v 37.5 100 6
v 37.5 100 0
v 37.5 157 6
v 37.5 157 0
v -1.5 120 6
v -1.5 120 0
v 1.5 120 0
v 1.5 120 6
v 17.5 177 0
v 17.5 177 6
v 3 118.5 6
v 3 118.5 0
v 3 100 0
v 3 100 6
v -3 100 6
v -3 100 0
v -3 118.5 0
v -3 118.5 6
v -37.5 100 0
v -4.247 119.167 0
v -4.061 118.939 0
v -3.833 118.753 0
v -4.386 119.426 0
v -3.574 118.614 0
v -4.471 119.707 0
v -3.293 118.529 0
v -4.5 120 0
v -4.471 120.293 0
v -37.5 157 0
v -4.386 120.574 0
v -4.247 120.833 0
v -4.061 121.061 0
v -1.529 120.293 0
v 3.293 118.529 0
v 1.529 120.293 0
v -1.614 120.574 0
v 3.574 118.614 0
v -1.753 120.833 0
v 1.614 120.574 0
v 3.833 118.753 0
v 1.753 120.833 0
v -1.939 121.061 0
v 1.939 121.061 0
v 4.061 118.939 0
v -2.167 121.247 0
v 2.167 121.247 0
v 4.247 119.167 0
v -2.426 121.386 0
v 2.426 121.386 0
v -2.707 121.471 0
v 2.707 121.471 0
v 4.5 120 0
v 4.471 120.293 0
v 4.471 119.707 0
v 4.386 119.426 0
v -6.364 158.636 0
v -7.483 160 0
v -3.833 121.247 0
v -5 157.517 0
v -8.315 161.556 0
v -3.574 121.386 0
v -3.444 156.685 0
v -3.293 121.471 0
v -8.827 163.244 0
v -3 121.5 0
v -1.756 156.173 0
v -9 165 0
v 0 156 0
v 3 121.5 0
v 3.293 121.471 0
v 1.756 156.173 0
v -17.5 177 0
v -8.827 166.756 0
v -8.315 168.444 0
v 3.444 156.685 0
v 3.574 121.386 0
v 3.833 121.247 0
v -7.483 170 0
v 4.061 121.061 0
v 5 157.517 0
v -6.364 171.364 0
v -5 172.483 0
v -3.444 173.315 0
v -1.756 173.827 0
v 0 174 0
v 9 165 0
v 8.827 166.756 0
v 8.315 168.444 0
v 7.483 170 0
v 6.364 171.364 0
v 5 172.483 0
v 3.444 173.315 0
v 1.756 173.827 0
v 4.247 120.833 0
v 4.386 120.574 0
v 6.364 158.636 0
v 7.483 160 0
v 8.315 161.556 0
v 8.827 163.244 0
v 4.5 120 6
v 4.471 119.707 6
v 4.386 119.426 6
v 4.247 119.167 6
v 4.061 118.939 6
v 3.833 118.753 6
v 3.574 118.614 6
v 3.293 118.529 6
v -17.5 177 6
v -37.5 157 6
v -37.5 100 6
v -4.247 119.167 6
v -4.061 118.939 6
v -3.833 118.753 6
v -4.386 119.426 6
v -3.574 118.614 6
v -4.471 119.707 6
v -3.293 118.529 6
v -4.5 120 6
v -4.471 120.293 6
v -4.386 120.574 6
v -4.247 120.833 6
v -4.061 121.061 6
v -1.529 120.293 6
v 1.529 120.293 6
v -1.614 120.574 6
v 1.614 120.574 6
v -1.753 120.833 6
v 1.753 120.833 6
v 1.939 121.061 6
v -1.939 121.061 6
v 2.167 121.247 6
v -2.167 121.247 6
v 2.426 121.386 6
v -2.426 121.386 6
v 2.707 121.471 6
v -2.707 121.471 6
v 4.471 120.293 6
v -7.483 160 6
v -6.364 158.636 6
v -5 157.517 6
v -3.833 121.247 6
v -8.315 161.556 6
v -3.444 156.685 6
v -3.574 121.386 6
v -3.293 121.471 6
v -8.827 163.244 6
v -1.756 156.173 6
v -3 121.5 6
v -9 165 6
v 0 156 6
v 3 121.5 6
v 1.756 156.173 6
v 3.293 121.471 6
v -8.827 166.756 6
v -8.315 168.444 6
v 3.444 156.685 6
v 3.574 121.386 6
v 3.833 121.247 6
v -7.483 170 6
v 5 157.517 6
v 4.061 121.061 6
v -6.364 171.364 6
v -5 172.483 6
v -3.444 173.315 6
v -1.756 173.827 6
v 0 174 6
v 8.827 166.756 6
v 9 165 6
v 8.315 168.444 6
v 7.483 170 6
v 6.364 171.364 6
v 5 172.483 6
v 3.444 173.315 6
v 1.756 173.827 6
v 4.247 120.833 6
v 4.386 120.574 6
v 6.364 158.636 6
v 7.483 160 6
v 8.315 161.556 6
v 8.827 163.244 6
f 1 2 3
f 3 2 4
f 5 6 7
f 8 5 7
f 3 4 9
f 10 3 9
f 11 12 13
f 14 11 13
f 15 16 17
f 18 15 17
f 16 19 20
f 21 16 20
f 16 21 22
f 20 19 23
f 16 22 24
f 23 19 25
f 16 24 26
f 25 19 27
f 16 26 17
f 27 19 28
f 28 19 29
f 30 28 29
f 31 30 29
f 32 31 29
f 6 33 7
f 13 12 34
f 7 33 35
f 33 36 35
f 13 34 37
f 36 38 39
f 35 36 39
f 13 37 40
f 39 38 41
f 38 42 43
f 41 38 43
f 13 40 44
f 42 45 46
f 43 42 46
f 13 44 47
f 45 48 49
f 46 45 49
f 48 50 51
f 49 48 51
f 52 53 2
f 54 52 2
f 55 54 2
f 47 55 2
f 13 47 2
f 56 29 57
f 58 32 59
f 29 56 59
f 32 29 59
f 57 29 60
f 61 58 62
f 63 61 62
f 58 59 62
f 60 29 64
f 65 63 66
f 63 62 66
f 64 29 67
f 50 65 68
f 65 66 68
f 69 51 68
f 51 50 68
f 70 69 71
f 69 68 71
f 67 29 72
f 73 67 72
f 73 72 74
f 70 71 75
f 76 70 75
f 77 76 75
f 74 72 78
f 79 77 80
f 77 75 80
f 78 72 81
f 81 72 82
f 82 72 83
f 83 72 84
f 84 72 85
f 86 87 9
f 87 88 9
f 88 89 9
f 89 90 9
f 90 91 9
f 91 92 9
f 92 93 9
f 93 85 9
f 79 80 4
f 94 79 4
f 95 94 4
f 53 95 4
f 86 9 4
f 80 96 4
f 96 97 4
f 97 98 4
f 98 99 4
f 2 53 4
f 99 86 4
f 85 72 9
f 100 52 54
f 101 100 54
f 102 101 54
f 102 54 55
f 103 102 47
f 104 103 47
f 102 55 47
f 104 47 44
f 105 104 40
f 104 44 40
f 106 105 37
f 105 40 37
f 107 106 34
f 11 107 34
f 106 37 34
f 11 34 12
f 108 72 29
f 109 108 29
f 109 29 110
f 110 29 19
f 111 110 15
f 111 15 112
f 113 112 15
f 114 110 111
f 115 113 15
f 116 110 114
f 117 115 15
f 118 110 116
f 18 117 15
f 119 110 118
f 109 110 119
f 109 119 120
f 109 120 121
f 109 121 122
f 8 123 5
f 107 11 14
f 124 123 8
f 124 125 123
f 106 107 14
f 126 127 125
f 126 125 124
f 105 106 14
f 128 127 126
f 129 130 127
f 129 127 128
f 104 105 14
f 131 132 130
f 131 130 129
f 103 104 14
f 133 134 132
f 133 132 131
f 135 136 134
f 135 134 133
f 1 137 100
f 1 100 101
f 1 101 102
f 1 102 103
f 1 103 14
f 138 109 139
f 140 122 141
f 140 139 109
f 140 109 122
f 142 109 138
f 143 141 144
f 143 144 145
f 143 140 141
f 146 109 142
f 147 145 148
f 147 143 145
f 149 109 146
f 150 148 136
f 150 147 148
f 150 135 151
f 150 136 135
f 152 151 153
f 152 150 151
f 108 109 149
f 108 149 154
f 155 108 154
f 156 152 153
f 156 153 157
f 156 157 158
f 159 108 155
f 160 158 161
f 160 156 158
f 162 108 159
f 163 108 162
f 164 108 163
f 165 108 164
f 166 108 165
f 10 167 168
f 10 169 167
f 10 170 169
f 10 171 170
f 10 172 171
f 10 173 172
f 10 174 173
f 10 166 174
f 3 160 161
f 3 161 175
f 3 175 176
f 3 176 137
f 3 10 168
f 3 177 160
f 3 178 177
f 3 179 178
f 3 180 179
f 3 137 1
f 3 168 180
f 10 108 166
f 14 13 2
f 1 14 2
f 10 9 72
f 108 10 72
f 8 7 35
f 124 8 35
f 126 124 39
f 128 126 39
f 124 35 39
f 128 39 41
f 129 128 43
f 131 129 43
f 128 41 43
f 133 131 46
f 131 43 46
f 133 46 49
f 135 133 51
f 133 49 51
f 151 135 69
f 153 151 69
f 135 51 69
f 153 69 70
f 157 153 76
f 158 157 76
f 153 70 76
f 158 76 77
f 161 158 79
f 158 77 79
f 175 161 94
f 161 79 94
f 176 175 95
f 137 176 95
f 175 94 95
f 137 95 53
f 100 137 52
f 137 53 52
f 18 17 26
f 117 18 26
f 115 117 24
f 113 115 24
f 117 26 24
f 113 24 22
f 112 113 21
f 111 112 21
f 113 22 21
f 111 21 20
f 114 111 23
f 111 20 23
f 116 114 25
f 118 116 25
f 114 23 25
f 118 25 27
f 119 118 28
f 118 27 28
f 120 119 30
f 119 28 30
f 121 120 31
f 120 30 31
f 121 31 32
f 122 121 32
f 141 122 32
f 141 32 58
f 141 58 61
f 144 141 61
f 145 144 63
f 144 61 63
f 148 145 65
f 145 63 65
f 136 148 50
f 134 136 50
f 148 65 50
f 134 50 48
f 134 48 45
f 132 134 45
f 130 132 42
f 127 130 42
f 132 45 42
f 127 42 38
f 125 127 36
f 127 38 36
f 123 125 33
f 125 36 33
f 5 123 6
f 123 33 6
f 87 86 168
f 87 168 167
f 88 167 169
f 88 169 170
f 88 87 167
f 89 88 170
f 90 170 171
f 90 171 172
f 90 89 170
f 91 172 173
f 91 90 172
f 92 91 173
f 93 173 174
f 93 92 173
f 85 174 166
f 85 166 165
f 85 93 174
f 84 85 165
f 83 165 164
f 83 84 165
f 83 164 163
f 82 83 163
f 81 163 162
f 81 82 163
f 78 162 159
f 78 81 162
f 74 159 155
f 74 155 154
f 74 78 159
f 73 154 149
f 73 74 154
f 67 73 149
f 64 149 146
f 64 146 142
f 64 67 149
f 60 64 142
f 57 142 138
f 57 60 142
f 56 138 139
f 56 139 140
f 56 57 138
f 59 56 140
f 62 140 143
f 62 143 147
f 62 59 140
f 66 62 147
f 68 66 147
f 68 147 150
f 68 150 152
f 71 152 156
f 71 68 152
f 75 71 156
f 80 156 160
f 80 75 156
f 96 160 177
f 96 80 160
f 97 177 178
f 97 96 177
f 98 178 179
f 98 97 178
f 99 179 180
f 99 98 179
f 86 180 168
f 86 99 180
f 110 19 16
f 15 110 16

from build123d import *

# Parameters (mm, degrees)
SKETCH1_R           = 9
BOSS_EXTRUDE1_DEPTH = 6


with BuildPart() as part:
    # Sketch1 → Boss-Extrude1 (new body)
    with BuildSketch(Plane.XY):
        with BuildLine():
            Line((3, 100), (37.5, 100))
            Line((37.5, 100), (37.5, 157))
            Line((37.5, 157), (17.5, 177))
            Line((17.5, 177), (-17.5, 177))
            Line((-17.5, 177), (-37.5, 157))
            Line((-37.5, 157), (-37.5, 100))
            Line((-37.5, 100), (-3, 100))
            Line((-3, 100), (-3, 118.5))
            ThreePointArc((-3, 118.5), (-4.060660172, 121.060660172), (-1.5, 120))
            Line((-1.5, 120), (1.5, 120))
            ThreePointArc((1.5, 120), (3, 121.5), (4.5, 120))
            ThreePointArc((4.5, 120), (4.060660172, 118.939339828), (3, 118.5))
            Line((3, 118.5), (3, 100))
        make_face()
        with Locations((8.6489e-05, 165)):
            Circle(SKETCH1_R, mode=Mode.SUBTRACT)
    extrude(amount=BOSS_EXTRUDE1_DEPTH)


solid = part.part
